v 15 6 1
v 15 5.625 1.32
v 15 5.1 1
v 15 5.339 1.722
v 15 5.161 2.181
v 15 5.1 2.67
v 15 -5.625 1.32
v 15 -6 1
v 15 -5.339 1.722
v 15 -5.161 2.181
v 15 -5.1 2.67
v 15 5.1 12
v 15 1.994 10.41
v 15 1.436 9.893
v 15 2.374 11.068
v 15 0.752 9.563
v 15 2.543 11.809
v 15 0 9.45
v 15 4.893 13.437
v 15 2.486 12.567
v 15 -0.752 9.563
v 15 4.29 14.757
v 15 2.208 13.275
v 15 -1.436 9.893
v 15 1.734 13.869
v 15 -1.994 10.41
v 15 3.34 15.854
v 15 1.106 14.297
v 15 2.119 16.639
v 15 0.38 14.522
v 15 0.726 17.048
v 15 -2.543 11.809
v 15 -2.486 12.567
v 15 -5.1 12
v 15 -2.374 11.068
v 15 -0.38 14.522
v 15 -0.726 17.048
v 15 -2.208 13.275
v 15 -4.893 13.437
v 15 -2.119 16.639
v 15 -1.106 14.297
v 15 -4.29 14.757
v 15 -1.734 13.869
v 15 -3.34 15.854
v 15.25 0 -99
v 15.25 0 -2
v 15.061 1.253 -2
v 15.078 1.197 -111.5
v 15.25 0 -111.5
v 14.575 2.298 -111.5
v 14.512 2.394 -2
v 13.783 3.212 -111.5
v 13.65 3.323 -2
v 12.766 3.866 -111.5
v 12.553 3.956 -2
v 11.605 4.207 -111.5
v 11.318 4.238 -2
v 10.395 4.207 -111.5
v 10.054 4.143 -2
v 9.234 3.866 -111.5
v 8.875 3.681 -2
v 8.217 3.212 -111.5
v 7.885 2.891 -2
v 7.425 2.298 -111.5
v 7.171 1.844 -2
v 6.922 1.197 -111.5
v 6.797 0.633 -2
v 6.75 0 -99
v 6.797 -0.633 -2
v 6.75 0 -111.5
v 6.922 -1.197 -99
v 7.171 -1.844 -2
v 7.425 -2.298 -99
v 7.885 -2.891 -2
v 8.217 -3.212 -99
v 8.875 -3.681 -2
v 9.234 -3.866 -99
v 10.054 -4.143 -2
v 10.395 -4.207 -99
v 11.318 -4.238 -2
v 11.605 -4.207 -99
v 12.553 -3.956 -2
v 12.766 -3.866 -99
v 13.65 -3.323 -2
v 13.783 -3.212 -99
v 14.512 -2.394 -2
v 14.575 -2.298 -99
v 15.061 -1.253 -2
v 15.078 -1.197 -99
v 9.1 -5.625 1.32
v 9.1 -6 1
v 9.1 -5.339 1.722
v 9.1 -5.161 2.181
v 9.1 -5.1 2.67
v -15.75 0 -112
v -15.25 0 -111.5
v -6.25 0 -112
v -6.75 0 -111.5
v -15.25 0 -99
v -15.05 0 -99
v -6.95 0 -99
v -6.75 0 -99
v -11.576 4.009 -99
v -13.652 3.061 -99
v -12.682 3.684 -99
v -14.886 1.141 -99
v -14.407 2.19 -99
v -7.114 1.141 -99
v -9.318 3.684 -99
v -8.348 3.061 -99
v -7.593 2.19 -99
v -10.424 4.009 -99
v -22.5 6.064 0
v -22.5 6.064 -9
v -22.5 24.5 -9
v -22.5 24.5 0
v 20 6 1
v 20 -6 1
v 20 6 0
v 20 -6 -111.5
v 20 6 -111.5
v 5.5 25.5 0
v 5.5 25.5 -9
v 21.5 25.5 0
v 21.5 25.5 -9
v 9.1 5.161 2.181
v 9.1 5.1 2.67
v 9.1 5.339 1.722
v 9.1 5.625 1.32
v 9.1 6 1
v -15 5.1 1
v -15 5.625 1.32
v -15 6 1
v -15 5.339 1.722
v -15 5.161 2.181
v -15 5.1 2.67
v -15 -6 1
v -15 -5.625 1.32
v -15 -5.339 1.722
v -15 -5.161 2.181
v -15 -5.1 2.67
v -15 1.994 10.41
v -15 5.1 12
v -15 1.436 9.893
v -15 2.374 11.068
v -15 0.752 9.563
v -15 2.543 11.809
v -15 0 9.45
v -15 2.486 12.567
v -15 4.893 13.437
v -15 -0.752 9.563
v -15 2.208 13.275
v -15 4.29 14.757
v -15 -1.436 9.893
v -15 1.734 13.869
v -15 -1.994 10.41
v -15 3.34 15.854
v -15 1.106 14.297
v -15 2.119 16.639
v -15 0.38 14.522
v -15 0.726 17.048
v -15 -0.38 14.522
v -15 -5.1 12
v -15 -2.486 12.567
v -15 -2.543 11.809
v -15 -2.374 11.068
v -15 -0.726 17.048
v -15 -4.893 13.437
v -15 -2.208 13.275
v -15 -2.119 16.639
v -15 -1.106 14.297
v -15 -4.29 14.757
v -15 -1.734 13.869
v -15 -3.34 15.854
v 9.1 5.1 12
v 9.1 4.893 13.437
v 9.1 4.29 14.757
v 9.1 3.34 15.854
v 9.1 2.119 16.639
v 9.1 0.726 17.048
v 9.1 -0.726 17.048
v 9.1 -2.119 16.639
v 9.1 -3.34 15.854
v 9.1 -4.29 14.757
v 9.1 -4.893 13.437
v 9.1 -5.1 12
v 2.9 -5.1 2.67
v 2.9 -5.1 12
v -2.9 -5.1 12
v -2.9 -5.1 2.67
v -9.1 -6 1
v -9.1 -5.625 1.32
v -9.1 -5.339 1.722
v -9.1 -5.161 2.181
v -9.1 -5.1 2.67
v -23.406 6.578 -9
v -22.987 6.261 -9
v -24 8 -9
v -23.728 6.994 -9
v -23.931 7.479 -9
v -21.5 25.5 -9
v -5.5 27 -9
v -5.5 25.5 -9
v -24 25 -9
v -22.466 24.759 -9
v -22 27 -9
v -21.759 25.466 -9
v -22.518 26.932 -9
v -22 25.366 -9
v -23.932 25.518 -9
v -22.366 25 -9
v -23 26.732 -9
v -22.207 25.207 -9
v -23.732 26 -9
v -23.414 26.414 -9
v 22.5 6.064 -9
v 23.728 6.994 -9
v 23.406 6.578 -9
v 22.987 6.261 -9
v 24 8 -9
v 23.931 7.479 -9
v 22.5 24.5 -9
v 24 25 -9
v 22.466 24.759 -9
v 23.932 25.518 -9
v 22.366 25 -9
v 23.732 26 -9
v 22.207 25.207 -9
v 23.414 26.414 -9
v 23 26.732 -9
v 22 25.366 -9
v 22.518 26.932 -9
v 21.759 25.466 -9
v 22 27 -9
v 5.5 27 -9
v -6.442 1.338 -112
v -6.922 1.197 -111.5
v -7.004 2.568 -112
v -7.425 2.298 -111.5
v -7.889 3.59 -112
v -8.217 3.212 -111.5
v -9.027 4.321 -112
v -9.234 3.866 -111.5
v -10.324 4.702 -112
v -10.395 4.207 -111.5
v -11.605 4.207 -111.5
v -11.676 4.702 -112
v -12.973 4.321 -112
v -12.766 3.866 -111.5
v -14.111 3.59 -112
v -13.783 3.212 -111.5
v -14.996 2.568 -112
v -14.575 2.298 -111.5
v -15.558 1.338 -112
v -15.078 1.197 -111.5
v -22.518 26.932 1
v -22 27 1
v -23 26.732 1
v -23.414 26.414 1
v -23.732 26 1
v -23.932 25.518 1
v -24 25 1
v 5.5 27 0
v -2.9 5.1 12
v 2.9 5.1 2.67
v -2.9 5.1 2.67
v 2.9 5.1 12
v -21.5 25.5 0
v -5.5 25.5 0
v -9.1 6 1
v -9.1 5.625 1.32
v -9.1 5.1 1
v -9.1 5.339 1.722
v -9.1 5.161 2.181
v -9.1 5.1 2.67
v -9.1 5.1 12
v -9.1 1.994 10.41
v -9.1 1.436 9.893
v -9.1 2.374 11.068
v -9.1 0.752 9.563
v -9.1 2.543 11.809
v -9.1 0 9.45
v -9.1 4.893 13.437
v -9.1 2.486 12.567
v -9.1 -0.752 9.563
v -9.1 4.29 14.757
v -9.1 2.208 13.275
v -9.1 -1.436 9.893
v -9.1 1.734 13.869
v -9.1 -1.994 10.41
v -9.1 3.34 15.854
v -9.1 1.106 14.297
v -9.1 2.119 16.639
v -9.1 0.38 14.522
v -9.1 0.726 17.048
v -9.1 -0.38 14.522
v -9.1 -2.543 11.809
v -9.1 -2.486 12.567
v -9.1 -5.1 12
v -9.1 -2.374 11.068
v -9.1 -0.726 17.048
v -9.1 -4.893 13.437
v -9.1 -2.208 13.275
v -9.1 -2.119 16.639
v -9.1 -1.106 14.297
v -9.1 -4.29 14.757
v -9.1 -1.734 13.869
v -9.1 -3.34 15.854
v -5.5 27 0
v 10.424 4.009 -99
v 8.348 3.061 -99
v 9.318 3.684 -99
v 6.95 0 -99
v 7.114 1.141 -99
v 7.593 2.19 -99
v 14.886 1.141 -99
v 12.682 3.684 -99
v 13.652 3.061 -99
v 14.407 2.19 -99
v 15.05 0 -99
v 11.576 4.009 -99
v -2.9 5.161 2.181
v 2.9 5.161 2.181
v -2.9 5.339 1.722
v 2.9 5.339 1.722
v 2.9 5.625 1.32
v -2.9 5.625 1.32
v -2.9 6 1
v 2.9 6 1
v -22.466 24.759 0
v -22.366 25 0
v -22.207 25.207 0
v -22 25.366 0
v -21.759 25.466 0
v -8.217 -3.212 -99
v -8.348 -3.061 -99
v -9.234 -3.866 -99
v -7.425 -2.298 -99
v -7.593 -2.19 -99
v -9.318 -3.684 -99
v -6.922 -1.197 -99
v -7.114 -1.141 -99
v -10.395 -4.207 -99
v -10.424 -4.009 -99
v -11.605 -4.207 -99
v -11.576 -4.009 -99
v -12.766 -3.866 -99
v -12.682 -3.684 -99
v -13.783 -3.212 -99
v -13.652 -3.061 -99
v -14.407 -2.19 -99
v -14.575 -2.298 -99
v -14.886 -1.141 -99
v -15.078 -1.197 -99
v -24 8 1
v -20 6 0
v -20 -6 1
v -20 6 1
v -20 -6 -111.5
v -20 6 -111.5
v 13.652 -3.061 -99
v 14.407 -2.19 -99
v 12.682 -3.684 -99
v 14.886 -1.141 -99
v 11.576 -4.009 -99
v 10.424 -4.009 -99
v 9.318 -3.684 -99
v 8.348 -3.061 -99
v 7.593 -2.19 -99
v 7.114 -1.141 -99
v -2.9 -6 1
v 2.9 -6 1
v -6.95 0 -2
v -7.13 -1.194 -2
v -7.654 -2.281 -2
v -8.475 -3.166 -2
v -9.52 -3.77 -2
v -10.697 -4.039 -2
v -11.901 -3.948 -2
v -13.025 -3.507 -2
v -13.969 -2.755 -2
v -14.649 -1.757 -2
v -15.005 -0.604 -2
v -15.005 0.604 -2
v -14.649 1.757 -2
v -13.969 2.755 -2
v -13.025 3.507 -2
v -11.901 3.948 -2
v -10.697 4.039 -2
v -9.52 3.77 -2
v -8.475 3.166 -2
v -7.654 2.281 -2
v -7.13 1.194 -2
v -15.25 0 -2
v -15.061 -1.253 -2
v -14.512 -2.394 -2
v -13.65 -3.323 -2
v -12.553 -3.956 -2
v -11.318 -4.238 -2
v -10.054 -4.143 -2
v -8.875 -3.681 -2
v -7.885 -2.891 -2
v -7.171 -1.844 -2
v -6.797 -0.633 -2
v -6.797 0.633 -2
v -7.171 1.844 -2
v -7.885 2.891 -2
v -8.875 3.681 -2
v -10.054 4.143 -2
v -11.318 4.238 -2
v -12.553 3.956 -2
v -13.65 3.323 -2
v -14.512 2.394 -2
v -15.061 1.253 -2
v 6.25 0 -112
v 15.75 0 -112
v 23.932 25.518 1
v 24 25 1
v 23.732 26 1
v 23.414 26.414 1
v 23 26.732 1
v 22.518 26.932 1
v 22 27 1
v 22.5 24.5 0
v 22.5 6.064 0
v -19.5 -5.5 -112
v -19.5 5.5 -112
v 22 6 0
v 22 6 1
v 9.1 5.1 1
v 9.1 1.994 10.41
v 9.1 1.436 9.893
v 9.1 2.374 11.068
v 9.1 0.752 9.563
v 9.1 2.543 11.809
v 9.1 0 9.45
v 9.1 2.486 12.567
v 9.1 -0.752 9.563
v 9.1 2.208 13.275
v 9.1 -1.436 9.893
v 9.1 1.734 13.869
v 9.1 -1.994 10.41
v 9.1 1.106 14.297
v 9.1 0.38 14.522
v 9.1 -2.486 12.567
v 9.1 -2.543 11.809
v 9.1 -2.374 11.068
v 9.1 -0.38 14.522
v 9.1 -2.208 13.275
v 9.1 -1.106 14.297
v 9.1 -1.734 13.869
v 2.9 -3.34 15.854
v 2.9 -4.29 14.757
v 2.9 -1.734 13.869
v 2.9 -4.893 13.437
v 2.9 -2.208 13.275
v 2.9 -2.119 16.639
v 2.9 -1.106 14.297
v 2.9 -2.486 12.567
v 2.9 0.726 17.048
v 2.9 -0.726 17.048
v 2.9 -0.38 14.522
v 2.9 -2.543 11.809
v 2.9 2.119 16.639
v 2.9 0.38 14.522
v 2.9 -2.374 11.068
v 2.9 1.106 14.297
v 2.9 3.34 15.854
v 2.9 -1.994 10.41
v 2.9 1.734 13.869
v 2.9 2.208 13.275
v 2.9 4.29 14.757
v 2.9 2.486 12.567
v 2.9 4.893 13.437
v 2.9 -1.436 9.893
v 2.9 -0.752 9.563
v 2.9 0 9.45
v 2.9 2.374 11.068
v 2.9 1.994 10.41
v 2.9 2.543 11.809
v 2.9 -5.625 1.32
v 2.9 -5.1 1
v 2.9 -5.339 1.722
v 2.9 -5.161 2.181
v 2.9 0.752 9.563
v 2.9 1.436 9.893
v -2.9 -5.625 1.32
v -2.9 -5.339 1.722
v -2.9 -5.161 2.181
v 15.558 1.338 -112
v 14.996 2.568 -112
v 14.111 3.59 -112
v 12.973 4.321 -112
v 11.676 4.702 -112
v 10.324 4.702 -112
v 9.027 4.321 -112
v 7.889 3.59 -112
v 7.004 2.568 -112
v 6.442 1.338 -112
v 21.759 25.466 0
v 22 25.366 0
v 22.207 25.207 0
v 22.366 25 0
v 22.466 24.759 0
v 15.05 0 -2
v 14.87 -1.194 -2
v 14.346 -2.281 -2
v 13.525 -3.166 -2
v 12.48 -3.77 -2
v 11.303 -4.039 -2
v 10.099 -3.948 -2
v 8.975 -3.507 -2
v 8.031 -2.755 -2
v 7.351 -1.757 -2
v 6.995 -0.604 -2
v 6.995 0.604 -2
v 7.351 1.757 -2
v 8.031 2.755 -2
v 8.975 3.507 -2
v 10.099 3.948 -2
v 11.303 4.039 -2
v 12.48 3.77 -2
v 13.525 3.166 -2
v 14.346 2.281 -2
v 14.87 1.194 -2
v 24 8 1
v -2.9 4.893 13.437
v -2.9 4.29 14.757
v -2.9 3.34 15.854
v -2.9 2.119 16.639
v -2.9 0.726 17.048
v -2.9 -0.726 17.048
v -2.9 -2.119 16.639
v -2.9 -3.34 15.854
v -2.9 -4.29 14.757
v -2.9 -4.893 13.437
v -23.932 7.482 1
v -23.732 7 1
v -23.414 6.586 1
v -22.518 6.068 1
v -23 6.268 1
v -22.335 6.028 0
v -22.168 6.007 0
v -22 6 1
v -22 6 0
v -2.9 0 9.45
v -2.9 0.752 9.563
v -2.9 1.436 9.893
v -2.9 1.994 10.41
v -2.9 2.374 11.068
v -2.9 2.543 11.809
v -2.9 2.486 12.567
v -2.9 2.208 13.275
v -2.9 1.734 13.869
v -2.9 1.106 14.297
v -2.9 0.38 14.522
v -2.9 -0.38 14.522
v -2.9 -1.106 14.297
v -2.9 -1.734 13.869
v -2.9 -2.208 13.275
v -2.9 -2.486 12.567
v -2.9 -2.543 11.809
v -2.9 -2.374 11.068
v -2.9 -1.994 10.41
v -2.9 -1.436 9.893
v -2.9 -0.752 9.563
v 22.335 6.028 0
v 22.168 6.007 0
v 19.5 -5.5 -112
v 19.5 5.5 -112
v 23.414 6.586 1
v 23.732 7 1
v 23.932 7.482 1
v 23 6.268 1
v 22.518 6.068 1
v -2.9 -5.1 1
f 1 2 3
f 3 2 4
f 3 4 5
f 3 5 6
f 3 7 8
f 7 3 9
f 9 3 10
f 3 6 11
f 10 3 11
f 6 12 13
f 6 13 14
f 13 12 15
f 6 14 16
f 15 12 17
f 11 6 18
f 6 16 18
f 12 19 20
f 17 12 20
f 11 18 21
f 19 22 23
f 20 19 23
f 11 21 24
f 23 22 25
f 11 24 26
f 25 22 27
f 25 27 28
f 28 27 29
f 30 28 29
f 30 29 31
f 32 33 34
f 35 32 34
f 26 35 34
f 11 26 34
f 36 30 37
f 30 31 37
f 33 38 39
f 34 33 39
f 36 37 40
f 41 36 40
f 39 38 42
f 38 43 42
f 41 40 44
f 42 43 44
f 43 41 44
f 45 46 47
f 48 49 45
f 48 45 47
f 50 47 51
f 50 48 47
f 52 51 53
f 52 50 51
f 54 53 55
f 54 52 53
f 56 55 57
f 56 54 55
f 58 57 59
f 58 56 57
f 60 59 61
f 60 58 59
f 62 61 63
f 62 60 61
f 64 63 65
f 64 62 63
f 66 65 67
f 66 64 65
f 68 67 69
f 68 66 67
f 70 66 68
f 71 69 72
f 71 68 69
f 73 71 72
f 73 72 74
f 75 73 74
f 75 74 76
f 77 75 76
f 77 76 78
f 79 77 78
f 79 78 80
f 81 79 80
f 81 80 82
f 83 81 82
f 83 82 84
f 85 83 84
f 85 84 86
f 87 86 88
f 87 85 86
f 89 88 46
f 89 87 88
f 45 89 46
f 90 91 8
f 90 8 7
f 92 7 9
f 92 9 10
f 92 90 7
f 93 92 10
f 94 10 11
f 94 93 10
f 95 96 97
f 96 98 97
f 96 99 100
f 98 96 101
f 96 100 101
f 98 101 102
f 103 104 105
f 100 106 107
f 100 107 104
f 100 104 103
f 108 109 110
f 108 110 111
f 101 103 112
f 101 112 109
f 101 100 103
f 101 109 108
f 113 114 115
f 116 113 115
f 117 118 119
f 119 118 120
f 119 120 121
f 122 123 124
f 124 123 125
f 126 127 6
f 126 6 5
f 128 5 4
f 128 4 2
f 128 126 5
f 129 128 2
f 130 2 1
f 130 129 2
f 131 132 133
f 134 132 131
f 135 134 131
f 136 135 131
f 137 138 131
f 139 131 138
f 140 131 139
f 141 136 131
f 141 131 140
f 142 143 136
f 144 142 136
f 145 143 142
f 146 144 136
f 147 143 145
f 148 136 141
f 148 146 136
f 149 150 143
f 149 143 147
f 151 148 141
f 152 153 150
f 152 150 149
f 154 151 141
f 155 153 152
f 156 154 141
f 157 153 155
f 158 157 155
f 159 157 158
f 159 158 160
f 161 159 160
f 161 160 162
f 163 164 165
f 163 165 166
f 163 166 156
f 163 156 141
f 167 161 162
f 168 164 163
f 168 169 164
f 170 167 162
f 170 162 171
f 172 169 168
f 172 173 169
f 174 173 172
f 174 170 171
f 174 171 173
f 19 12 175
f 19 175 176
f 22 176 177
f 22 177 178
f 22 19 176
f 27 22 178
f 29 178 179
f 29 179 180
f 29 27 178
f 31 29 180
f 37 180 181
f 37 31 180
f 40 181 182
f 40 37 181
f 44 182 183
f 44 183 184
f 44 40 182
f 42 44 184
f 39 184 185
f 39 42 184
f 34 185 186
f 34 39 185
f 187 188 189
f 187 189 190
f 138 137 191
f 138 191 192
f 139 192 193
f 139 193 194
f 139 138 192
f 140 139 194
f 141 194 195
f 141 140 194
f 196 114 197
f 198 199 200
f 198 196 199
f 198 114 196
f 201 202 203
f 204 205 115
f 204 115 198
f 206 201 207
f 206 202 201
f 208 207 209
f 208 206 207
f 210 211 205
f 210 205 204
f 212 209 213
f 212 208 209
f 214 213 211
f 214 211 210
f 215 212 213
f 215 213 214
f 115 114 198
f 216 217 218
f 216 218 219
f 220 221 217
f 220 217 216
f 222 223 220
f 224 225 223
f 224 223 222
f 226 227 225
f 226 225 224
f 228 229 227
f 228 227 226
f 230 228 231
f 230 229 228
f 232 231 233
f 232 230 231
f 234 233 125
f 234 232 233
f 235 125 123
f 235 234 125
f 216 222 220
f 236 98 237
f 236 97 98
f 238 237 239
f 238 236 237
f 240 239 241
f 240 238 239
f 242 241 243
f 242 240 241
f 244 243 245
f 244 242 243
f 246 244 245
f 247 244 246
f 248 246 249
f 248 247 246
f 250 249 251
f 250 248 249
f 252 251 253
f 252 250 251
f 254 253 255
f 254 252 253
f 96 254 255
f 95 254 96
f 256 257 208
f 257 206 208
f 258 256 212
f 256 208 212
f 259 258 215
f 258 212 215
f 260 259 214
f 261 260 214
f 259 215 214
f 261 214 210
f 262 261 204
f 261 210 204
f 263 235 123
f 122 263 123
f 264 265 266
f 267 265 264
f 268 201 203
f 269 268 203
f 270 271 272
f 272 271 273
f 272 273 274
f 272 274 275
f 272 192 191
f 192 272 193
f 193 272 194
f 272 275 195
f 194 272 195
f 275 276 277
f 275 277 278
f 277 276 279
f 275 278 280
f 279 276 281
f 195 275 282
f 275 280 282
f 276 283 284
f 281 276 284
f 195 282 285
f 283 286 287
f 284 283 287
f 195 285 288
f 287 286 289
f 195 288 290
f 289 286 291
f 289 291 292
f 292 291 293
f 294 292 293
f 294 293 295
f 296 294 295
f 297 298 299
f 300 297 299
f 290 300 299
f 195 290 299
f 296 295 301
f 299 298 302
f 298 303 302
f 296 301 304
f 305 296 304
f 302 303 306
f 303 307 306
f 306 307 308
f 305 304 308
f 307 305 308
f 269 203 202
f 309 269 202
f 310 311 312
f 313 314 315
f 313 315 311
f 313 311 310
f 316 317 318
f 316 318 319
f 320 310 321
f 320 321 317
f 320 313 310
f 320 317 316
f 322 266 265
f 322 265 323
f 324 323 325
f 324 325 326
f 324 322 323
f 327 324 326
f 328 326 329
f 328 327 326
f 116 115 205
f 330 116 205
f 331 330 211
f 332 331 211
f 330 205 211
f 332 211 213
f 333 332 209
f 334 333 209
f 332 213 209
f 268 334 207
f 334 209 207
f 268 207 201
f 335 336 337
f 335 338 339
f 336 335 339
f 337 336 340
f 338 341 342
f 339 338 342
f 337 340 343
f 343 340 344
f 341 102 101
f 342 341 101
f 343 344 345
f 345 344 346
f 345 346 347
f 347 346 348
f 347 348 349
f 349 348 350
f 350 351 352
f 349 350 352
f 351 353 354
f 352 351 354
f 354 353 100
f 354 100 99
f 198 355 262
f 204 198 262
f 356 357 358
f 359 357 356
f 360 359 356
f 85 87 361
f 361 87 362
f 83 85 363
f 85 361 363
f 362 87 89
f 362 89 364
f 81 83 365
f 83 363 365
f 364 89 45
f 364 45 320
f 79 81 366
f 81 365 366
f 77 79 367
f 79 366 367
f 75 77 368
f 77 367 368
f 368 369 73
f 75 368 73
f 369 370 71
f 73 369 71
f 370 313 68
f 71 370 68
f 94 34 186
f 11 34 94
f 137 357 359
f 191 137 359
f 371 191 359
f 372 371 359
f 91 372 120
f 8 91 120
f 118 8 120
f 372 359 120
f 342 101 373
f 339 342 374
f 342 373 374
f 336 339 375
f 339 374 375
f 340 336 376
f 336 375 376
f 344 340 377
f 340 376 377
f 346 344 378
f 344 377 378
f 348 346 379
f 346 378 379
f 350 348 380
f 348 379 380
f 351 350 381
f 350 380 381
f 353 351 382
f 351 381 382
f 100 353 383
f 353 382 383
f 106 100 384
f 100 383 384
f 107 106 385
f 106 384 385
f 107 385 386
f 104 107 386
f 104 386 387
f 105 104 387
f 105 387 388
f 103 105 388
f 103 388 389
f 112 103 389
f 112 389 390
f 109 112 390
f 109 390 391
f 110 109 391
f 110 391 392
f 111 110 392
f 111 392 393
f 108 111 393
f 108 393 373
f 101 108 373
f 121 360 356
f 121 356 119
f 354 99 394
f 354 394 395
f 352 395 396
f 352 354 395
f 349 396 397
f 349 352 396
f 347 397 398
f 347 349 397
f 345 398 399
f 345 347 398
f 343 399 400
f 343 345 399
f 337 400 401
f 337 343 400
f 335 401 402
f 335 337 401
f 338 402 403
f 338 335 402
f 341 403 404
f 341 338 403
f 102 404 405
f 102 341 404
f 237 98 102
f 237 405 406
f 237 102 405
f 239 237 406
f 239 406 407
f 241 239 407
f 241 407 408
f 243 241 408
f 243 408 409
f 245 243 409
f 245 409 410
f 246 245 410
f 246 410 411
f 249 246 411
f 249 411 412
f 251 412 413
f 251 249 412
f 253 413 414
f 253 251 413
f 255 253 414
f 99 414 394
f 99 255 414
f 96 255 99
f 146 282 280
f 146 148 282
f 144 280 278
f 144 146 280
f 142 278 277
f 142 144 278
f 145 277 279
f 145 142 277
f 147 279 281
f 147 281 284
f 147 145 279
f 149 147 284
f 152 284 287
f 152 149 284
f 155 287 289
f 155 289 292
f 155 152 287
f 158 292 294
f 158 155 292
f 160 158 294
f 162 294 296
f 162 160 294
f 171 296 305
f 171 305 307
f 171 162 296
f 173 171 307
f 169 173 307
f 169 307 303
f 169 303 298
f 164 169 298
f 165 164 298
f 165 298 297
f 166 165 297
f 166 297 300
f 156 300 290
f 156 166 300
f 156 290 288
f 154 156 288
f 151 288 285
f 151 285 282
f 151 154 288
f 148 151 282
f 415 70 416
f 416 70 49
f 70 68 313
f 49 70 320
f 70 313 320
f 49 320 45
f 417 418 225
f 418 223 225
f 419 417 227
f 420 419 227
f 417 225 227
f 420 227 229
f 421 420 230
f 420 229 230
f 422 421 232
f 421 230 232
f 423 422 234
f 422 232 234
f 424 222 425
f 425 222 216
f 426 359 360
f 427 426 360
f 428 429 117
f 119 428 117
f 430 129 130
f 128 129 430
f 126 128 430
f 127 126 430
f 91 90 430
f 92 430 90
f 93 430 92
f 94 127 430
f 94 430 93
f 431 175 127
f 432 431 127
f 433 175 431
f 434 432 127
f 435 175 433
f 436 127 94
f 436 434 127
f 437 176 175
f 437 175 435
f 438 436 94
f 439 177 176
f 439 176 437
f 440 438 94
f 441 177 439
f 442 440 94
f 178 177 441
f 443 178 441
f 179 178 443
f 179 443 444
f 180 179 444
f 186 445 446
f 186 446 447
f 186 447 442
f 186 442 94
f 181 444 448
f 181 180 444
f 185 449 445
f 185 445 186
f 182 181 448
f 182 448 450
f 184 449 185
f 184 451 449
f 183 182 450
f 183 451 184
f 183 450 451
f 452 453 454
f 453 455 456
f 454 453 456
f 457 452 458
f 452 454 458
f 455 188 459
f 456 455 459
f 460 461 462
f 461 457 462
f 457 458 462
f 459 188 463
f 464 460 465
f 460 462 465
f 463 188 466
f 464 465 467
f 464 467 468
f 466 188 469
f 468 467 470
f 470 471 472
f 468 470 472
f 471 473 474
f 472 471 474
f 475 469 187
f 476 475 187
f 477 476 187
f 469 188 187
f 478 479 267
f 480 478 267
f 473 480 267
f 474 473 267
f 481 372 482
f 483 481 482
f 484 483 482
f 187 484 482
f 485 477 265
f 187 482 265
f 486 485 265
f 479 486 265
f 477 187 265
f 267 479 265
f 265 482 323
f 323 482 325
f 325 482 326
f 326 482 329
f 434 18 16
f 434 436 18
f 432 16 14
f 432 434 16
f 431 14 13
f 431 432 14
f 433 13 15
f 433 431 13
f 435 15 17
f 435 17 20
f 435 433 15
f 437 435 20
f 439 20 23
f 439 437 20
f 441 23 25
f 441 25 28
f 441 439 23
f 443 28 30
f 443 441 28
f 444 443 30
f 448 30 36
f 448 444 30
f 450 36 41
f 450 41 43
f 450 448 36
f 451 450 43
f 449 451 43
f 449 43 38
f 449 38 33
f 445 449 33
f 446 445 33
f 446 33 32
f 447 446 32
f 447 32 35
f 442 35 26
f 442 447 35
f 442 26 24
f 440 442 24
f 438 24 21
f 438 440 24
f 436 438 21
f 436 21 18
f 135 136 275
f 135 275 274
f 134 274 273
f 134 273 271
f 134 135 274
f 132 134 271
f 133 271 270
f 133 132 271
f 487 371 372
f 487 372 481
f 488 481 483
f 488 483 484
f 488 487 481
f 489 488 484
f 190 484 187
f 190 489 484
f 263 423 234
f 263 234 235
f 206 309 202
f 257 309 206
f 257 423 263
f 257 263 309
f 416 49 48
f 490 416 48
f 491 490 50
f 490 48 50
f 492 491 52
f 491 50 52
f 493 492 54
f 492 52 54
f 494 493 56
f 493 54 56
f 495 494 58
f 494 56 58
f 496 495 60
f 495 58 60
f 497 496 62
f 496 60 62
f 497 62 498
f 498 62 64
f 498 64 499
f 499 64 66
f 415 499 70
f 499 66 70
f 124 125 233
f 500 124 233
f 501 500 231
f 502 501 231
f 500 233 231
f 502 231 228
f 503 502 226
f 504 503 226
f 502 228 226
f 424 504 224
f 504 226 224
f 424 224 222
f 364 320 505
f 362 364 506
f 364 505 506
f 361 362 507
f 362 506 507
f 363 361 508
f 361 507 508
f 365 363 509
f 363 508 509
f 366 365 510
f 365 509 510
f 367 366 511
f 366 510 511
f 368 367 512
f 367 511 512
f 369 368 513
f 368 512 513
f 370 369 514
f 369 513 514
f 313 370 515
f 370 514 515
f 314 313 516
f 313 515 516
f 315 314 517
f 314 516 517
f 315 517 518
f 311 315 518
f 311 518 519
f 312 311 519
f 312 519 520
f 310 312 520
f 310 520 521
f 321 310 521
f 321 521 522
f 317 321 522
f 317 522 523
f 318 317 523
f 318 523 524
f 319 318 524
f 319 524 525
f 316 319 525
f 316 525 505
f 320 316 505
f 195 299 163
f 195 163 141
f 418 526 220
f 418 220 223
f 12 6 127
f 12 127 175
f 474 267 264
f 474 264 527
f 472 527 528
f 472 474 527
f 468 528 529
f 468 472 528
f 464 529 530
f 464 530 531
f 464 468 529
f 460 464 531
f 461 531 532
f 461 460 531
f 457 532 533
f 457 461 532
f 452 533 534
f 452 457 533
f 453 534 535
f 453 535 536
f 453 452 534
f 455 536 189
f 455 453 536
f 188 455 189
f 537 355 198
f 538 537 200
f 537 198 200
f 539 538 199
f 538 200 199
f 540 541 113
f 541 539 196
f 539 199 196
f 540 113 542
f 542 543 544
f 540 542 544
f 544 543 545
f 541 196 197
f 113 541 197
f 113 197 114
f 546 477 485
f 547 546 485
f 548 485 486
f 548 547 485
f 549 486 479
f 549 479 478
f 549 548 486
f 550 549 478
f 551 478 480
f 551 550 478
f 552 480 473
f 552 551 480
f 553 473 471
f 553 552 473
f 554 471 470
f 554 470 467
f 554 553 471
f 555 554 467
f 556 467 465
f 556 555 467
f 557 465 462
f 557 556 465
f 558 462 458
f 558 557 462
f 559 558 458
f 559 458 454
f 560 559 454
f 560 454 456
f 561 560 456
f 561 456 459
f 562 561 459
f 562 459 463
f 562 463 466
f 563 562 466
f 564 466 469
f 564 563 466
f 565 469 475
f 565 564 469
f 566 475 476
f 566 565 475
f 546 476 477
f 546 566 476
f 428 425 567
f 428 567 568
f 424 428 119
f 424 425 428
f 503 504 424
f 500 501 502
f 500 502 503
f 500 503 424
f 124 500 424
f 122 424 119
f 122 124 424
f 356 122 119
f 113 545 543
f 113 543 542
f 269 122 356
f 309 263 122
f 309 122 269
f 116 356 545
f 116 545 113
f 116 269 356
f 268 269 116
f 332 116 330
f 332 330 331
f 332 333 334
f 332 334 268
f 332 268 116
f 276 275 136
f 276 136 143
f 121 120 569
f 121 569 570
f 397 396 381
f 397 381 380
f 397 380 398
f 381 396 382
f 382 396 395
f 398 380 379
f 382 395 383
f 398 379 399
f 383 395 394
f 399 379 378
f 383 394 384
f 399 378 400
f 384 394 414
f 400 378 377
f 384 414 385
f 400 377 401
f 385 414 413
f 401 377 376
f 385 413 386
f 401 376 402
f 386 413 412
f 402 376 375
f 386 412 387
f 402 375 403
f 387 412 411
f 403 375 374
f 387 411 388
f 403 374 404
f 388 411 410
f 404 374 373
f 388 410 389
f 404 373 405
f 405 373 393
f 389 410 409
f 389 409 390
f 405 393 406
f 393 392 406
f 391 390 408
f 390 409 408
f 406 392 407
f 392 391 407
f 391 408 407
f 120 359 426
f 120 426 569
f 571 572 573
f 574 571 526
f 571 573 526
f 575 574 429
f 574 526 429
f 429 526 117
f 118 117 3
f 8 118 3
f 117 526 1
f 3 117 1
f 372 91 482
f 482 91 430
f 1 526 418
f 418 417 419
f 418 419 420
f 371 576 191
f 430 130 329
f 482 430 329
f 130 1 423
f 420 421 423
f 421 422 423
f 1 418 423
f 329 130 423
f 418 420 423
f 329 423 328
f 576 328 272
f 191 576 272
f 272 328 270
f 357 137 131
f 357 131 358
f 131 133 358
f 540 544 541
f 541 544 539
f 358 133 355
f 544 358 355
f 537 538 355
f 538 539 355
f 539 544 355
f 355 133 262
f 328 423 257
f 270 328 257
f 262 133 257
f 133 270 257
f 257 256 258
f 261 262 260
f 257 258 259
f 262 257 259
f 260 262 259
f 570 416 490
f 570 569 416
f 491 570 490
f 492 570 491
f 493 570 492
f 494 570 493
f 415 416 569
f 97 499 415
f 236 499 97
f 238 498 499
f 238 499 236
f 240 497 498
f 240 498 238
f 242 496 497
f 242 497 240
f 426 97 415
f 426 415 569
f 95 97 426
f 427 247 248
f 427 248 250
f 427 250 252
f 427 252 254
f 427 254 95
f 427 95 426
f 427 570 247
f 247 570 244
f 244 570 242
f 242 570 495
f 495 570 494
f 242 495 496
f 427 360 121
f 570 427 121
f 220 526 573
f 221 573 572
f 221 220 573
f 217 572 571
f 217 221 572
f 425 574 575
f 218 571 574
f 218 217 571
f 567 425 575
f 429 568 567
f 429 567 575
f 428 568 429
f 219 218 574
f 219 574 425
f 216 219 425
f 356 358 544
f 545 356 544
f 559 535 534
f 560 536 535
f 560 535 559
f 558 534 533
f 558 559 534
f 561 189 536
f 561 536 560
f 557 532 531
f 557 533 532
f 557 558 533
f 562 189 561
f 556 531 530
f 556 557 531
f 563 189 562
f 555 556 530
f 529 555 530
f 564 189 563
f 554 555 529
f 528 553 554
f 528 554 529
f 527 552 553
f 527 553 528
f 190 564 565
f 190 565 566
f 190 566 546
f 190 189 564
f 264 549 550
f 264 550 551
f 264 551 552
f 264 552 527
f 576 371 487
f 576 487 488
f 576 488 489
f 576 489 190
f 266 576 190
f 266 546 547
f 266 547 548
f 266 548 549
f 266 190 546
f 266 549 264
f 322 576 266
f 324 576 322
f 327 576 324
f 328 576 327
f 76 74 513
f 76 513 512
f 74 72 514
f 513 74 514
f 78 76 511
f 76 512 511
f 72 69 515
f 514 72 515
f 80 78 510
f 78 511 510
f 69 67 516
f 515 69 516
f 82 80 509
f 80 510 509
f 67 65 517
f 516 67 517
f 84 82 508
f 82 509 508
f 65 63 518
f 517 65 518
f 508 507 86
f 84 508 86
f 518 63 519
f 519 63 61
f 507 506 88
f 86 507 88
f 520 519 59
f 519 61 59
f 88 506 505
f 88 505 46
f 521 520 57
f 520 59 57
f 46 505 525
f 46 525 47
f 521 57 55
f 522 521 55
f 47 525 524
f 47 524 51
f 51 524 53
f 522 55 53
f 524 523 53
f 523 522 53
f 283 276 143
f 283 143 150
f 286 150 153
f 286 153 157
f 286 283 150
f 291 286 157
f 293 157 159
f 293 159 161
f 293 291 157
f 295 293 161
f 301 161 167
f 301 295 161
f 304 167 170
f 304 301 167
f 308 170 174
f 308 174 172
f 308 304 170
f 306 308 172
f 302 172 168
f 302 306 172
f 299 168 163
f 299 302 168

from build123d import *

# Parameters (mm, degrees)
BOSS_EXTRUDE1_DEPTH      = 1
BOSS_EXTRUDE1_DEPTH_BACK = 112
SKETCH1_W                = 40
SKETCH1_H                = 12
SKETCH1_R                = 4.25
SKETCH3_R                = 2.55
BOSS_EXTRUDE2_DEPTH      = 15
CUT_EXTRUDE1_START       = -2.9
SKETCH3_2_R              = 2.55
CUT_EXTRUDE1_DEPTH       = 6.2
BOSS_EXTRUDE3_START      = -3
SKETCH5_R                = 4.25
BOSS_EXTRUDE3_DEPTH      = 3
CHAMFER3_SIZE            = 0.5
FILLET3_R                = 2
SKETCH12_R               = 4.05
BOSS_EXTRUDE9_DEPTH      = 100
SKETCH18_W               = 48
SKETCH18_H               = 21
BOSS_EXTRUDE11_DEPTH     = 10
FILLET10_R               = 2
CUT_EXTRUDE8_DEPTH       = 9
BOSS_EXTRUDE12_DEPTH     = 13


with BuildPart() as part:
    # Sketch1 → Boss-Extrude1 (new, two sides: drawn at the far end of the back side and taken through both)
    with BuildSketch(Plane.XY.offset(-BOSS_EXTRUDE1_DEPTH_BACK)):
        Rectangle(SKETCH1_W, SKETCH1_H)
        with Locations((11, 0)):
            Circle(SKETCH1_R, mode=Mode.SUBTRACT)
        with Locations(Location((-11, 0, 0), (0, 0, 180))):
            Circle(SKETCH1_R, mode=Mode.SUBTRACT)
    extrude(amount=BOSS_EXTRUDE1_DEPTH + BOSS_EXTRUDE1_DEPTH_BACK)

    # Sketch3 → Boss-Extrude2 (add, symmetric)
    with BuildSketch(Plane(origin=(0, 0, 0), x_dir=(0, 0, -1), z_dir=(1, 0, 0))):
        with BuildLine():
            Line((-12, -5.1), (-1, -5.1))
            Line((-1, -5.1), (-1, 5.1))
            Line((-1, 5.1), (-12, 5.1))
            ThreePointArc((-12, 5.1), (-17.1, 0), (-12, -5.1))
        make_face()
        with Locations((-12, 0)):
            Circle(SKETCH3_R, mode=Mode.SUBTRACT)
    extrude(amount=BOSS_EXTRUDE2_DEPTH, both=True)

    # Sketch3<2> → Cut-Extrude1 (cut)
    with BuildSketch(Plane(origin=(0, 0, 0), x_dir=(0, 0, -1), z_dir=(1, 0, 0)).offset(CUT_EXTRUDE1_START)):
        with BuildLine():
            Line((-12, -5.1), (-1, -5.1))
            Line((-1, -5.1), (-1, 5.1))
            Line((-1, 5.1), (-12, 5.1))
            ThreePointArc((-12, 5.1), (-17.1, 0), (-12, -5.1))
        make_face()
        with Locations((-12, 0)):
            Circle(SKETCH3_2_R, mode=Mode.SUBTRACT)
    cut_extrude1 = extrude(amount=-CUT_EXTRUDE1_DEPTH, mode=Mode.SUBTRACT)

    # Mirror1: Cut-Extrude1 across plane
    add(cut_extrude1.mirror(Plane(origin=(0, 0, 0), x_dir=(0, 0, 1), z_dir=(1, 0, 0))), mode=Mode.SUBTRACT)

    # Sketch5 → Boss-Extrude3 (add)
    with BuildSketch(Plane.XY.offset(1).offset(BOSS_EXTRUDE3_START)):
        with Locations((-11, 0)):
            Circle(SKETCH5_R)
        with Locations((11, 0)):
            Circle(SKETCH5_R)
    extrude(amount=BOSS_EXTRUDE3_DEPTH)

    # Chamfer3
    chamfer3_edges = [part.edges().sort_by_distance(p)[0] for p in [
        (6.75, 0, -112),
        (-20, 0, -112),
        (-6.75, 0, -112),
        (0, -6, -112),
        (20, 0, -112),
        (0, 6, -112),
    ]]
    chamfer(chamfer3_edges, length=CHAMFER3_SIZE)

    # Fillet3
    # the kernel refuses this fillet: 2 mm, written as the material it adds along each edge
    with BuildSketch(Plane(origin=(9.1, -5.1, 1), x_dir=(0, -1.0, 1.5367953823073576e-12), z_dir=(1, 0, 0)), Plane(origin=(-15, -5.1, 1), x_dir=(0, -1.0, 1.5367953823073576e-12), z_dir=(1, 0, 0))) as fillet3_piece_1:
        with BuildLine():
            CenterArc((2, -1.670329309), FILLET3_R, 123.367012969, 56.632987031)
            Line((0, -1.670329309), (-0.04, -1.670329309))
            Line((-0.04, -1.670329309), (-0.04, 0))
            Line((-0.04, 0), (0, 0.04))
            ThreePointArc((0, 0.04), (0.45, 0.04), (0.878, 0.033406586))
            Line((0.878, 0.033406586), (0.9, 0))
        make_face()
    extrude(amount=5.9)
    with BuildSketch(Plane(origin=(9.1, 5.1, 1), x_dir=(0, 1.0, 1.5343282200304168e-12), z_dir=(1, 0, 0)), Plane(origin=(-15, 5.1, 1), x_dir=(0, 1.0, 1.5340815038027225e-12), z_dir=(1, 0, 0))) as fillet3_piece_2:
        with BuildLine():
            CenterArc((2, 1.670329309), FILLET3_R, 180, 56.632987031)
            Line((0, 1.670329309), (-0.04, 1.670329309))
            Line((-0.04, 1.670329309), (-0.04, 0))
            Line((-0.04, 0), (0, -0.04))
            ThreePointArc((0, -0.04), (0.45, -0.04), (0.878, -0.033406586))
            Line((0.878, -0.033406586), (0.9, 0))
        make_face()
    extrude(amount=5.9)
    with BuildSketch(Plane(origin=(-2.9, 5.1, 1), x_dir=(0, 1.0, 1.5343282200304168e-12), z_dir=(1, 0, 0))) as fillet3_piece_3:
        with BuildLine():
            CenterArc((2, 1.670329309), FILLET3_R, 180, 56.632987031)
            Line((0, 1.670329309), (-0.04, 1.670329309))
            Line((-0.04, 1.670329309), (-0.04, 0))
            Line((-0.04, 0), (0, -0.04))
            ThreePointArc((0, -0.04), (0.45, -0.04), (0.878, -0.033406586))
            Line((0.878, -0.033406586), (0.9, 0))
        make_face()
    extrude(amount=5.8)
    with BuildSketch(Plane(origin=(-2.9, -5.1, 1), x_dir=(0, -1.0, 1.5367953823073576e-12), z_dir=(1, 0, 0))) as fillet3_piece_4:
        with BuildLine():
            CenterArc((2, -1.670329309), FILLET3_R, 123.367012969, 56.632987031)
            Line((0, -1.670329309), (-0.04, -1.670329309))
            Line((-0.04, -1.670329309), (-0.04, 0))
            Line((-0.04, 0), (0, 0.04))
            ThreePointArc((0, 0.04), (0.45, 0.04), (0.878, 0.033406586))
            Line((0.878, 0.033406586), (0.9, 0))
        make_face()
    extrude(amount=5.8)

    # Sketch12 → Boss-Extrude9 (add)
    with BuildSketch(Plane(origin=(0, 0, 1), x_dir=(-1, 0, 0), z_dir=(0, 0, -1))):
        with Locations(Location((11, 0, 0), (0, 0, 180))):
            Circle(SKETCH12_R)
        with Locations(Location((-11, 0, 0), (0, 0, 180))):
            Circle(SKETCH12_R)
    extrude(amount=BOSS_EXTRUDE9_DEPTH)

    # Sketch18 → Boss-Extrude11 (add)
    with BuildSketch(Plane(origin=(0, 0, 1), x_dir=(-1, 0, 0), z_dir=(0, 0, -1))):
        with Locations((0, 16.5)):
            Rectangle(SKETCH18_W, SKETCH18_H)
    extrude(amount=BOSS_EXTRUDE11_DEPTH)

    # Fillet10
    fillet10_edges = [part.edges().sort_by_distance(p)[0] for p in [
        (-24, 6, -4),
        (-24, 27, -4),
        (24, 27, -4),
        (24, 6, -4),
    ]]
    fillet(fillet10_edges, radius=FILLET10_R)

    # Sketch20 → Cut-Extrude8 (cut)
    with BuildSketch(Plane(origin=(0, 0, -9), x_dir=(-1, 0, 0), z_dir=(0, 0, -1))):
        with BuildLine():
            Line((-22.5, 24.5), (-22.5, 6))
            Line((-22.5, 6), (22.5, 6))
            Line((22.5, 6), (22.5, 24.5))
            ThreePointArc((22.5, 24.5), (22.207106781, 25.207106781), (21.5, 25.5))
            Line((21.5, 25.5), (5.5, 25.5))
            Line((5.5, 25.5), (5.5, 27))
            Line((5.5, 27), (-5.5, 27))
            Line((-5.5, 27), (-5.5, 25.5))
            Line((-5.5, 25.5), (-21.5, 25.5))
            ThreePointArc((-21.5, 25.5), (-22.207106781, 25.207106781), (-22.5, 24.5))
        make_face()
    extrude(amount=-CUT_EXTRUDE8_DEPTH, mode=Mode.SUBTRACT)

    # Sketch22 → Boss-Extrude12 (add)
    with BuildSketch(Plane(origin=(0, 0, -99), x_dir=(-1, 0, 0), z_dir=(0, 0, -1))):
        with BuildLine():
            Line((15.75, 0), (6.25, 0))
            ThreePointArc((6.25, 0), (11, -4.75), (15.75, 0))
        make_face()
        with BuildLine():
            Line((-6.25, 0), (-15.75, 0))
            ThreePointArc((-15.75, 0), (-11, -4.75), (-6.25, 0))
        make_face()
    extrude(amount=BOSS_EXTRUDE12_DEPTH)


solid = part.part
